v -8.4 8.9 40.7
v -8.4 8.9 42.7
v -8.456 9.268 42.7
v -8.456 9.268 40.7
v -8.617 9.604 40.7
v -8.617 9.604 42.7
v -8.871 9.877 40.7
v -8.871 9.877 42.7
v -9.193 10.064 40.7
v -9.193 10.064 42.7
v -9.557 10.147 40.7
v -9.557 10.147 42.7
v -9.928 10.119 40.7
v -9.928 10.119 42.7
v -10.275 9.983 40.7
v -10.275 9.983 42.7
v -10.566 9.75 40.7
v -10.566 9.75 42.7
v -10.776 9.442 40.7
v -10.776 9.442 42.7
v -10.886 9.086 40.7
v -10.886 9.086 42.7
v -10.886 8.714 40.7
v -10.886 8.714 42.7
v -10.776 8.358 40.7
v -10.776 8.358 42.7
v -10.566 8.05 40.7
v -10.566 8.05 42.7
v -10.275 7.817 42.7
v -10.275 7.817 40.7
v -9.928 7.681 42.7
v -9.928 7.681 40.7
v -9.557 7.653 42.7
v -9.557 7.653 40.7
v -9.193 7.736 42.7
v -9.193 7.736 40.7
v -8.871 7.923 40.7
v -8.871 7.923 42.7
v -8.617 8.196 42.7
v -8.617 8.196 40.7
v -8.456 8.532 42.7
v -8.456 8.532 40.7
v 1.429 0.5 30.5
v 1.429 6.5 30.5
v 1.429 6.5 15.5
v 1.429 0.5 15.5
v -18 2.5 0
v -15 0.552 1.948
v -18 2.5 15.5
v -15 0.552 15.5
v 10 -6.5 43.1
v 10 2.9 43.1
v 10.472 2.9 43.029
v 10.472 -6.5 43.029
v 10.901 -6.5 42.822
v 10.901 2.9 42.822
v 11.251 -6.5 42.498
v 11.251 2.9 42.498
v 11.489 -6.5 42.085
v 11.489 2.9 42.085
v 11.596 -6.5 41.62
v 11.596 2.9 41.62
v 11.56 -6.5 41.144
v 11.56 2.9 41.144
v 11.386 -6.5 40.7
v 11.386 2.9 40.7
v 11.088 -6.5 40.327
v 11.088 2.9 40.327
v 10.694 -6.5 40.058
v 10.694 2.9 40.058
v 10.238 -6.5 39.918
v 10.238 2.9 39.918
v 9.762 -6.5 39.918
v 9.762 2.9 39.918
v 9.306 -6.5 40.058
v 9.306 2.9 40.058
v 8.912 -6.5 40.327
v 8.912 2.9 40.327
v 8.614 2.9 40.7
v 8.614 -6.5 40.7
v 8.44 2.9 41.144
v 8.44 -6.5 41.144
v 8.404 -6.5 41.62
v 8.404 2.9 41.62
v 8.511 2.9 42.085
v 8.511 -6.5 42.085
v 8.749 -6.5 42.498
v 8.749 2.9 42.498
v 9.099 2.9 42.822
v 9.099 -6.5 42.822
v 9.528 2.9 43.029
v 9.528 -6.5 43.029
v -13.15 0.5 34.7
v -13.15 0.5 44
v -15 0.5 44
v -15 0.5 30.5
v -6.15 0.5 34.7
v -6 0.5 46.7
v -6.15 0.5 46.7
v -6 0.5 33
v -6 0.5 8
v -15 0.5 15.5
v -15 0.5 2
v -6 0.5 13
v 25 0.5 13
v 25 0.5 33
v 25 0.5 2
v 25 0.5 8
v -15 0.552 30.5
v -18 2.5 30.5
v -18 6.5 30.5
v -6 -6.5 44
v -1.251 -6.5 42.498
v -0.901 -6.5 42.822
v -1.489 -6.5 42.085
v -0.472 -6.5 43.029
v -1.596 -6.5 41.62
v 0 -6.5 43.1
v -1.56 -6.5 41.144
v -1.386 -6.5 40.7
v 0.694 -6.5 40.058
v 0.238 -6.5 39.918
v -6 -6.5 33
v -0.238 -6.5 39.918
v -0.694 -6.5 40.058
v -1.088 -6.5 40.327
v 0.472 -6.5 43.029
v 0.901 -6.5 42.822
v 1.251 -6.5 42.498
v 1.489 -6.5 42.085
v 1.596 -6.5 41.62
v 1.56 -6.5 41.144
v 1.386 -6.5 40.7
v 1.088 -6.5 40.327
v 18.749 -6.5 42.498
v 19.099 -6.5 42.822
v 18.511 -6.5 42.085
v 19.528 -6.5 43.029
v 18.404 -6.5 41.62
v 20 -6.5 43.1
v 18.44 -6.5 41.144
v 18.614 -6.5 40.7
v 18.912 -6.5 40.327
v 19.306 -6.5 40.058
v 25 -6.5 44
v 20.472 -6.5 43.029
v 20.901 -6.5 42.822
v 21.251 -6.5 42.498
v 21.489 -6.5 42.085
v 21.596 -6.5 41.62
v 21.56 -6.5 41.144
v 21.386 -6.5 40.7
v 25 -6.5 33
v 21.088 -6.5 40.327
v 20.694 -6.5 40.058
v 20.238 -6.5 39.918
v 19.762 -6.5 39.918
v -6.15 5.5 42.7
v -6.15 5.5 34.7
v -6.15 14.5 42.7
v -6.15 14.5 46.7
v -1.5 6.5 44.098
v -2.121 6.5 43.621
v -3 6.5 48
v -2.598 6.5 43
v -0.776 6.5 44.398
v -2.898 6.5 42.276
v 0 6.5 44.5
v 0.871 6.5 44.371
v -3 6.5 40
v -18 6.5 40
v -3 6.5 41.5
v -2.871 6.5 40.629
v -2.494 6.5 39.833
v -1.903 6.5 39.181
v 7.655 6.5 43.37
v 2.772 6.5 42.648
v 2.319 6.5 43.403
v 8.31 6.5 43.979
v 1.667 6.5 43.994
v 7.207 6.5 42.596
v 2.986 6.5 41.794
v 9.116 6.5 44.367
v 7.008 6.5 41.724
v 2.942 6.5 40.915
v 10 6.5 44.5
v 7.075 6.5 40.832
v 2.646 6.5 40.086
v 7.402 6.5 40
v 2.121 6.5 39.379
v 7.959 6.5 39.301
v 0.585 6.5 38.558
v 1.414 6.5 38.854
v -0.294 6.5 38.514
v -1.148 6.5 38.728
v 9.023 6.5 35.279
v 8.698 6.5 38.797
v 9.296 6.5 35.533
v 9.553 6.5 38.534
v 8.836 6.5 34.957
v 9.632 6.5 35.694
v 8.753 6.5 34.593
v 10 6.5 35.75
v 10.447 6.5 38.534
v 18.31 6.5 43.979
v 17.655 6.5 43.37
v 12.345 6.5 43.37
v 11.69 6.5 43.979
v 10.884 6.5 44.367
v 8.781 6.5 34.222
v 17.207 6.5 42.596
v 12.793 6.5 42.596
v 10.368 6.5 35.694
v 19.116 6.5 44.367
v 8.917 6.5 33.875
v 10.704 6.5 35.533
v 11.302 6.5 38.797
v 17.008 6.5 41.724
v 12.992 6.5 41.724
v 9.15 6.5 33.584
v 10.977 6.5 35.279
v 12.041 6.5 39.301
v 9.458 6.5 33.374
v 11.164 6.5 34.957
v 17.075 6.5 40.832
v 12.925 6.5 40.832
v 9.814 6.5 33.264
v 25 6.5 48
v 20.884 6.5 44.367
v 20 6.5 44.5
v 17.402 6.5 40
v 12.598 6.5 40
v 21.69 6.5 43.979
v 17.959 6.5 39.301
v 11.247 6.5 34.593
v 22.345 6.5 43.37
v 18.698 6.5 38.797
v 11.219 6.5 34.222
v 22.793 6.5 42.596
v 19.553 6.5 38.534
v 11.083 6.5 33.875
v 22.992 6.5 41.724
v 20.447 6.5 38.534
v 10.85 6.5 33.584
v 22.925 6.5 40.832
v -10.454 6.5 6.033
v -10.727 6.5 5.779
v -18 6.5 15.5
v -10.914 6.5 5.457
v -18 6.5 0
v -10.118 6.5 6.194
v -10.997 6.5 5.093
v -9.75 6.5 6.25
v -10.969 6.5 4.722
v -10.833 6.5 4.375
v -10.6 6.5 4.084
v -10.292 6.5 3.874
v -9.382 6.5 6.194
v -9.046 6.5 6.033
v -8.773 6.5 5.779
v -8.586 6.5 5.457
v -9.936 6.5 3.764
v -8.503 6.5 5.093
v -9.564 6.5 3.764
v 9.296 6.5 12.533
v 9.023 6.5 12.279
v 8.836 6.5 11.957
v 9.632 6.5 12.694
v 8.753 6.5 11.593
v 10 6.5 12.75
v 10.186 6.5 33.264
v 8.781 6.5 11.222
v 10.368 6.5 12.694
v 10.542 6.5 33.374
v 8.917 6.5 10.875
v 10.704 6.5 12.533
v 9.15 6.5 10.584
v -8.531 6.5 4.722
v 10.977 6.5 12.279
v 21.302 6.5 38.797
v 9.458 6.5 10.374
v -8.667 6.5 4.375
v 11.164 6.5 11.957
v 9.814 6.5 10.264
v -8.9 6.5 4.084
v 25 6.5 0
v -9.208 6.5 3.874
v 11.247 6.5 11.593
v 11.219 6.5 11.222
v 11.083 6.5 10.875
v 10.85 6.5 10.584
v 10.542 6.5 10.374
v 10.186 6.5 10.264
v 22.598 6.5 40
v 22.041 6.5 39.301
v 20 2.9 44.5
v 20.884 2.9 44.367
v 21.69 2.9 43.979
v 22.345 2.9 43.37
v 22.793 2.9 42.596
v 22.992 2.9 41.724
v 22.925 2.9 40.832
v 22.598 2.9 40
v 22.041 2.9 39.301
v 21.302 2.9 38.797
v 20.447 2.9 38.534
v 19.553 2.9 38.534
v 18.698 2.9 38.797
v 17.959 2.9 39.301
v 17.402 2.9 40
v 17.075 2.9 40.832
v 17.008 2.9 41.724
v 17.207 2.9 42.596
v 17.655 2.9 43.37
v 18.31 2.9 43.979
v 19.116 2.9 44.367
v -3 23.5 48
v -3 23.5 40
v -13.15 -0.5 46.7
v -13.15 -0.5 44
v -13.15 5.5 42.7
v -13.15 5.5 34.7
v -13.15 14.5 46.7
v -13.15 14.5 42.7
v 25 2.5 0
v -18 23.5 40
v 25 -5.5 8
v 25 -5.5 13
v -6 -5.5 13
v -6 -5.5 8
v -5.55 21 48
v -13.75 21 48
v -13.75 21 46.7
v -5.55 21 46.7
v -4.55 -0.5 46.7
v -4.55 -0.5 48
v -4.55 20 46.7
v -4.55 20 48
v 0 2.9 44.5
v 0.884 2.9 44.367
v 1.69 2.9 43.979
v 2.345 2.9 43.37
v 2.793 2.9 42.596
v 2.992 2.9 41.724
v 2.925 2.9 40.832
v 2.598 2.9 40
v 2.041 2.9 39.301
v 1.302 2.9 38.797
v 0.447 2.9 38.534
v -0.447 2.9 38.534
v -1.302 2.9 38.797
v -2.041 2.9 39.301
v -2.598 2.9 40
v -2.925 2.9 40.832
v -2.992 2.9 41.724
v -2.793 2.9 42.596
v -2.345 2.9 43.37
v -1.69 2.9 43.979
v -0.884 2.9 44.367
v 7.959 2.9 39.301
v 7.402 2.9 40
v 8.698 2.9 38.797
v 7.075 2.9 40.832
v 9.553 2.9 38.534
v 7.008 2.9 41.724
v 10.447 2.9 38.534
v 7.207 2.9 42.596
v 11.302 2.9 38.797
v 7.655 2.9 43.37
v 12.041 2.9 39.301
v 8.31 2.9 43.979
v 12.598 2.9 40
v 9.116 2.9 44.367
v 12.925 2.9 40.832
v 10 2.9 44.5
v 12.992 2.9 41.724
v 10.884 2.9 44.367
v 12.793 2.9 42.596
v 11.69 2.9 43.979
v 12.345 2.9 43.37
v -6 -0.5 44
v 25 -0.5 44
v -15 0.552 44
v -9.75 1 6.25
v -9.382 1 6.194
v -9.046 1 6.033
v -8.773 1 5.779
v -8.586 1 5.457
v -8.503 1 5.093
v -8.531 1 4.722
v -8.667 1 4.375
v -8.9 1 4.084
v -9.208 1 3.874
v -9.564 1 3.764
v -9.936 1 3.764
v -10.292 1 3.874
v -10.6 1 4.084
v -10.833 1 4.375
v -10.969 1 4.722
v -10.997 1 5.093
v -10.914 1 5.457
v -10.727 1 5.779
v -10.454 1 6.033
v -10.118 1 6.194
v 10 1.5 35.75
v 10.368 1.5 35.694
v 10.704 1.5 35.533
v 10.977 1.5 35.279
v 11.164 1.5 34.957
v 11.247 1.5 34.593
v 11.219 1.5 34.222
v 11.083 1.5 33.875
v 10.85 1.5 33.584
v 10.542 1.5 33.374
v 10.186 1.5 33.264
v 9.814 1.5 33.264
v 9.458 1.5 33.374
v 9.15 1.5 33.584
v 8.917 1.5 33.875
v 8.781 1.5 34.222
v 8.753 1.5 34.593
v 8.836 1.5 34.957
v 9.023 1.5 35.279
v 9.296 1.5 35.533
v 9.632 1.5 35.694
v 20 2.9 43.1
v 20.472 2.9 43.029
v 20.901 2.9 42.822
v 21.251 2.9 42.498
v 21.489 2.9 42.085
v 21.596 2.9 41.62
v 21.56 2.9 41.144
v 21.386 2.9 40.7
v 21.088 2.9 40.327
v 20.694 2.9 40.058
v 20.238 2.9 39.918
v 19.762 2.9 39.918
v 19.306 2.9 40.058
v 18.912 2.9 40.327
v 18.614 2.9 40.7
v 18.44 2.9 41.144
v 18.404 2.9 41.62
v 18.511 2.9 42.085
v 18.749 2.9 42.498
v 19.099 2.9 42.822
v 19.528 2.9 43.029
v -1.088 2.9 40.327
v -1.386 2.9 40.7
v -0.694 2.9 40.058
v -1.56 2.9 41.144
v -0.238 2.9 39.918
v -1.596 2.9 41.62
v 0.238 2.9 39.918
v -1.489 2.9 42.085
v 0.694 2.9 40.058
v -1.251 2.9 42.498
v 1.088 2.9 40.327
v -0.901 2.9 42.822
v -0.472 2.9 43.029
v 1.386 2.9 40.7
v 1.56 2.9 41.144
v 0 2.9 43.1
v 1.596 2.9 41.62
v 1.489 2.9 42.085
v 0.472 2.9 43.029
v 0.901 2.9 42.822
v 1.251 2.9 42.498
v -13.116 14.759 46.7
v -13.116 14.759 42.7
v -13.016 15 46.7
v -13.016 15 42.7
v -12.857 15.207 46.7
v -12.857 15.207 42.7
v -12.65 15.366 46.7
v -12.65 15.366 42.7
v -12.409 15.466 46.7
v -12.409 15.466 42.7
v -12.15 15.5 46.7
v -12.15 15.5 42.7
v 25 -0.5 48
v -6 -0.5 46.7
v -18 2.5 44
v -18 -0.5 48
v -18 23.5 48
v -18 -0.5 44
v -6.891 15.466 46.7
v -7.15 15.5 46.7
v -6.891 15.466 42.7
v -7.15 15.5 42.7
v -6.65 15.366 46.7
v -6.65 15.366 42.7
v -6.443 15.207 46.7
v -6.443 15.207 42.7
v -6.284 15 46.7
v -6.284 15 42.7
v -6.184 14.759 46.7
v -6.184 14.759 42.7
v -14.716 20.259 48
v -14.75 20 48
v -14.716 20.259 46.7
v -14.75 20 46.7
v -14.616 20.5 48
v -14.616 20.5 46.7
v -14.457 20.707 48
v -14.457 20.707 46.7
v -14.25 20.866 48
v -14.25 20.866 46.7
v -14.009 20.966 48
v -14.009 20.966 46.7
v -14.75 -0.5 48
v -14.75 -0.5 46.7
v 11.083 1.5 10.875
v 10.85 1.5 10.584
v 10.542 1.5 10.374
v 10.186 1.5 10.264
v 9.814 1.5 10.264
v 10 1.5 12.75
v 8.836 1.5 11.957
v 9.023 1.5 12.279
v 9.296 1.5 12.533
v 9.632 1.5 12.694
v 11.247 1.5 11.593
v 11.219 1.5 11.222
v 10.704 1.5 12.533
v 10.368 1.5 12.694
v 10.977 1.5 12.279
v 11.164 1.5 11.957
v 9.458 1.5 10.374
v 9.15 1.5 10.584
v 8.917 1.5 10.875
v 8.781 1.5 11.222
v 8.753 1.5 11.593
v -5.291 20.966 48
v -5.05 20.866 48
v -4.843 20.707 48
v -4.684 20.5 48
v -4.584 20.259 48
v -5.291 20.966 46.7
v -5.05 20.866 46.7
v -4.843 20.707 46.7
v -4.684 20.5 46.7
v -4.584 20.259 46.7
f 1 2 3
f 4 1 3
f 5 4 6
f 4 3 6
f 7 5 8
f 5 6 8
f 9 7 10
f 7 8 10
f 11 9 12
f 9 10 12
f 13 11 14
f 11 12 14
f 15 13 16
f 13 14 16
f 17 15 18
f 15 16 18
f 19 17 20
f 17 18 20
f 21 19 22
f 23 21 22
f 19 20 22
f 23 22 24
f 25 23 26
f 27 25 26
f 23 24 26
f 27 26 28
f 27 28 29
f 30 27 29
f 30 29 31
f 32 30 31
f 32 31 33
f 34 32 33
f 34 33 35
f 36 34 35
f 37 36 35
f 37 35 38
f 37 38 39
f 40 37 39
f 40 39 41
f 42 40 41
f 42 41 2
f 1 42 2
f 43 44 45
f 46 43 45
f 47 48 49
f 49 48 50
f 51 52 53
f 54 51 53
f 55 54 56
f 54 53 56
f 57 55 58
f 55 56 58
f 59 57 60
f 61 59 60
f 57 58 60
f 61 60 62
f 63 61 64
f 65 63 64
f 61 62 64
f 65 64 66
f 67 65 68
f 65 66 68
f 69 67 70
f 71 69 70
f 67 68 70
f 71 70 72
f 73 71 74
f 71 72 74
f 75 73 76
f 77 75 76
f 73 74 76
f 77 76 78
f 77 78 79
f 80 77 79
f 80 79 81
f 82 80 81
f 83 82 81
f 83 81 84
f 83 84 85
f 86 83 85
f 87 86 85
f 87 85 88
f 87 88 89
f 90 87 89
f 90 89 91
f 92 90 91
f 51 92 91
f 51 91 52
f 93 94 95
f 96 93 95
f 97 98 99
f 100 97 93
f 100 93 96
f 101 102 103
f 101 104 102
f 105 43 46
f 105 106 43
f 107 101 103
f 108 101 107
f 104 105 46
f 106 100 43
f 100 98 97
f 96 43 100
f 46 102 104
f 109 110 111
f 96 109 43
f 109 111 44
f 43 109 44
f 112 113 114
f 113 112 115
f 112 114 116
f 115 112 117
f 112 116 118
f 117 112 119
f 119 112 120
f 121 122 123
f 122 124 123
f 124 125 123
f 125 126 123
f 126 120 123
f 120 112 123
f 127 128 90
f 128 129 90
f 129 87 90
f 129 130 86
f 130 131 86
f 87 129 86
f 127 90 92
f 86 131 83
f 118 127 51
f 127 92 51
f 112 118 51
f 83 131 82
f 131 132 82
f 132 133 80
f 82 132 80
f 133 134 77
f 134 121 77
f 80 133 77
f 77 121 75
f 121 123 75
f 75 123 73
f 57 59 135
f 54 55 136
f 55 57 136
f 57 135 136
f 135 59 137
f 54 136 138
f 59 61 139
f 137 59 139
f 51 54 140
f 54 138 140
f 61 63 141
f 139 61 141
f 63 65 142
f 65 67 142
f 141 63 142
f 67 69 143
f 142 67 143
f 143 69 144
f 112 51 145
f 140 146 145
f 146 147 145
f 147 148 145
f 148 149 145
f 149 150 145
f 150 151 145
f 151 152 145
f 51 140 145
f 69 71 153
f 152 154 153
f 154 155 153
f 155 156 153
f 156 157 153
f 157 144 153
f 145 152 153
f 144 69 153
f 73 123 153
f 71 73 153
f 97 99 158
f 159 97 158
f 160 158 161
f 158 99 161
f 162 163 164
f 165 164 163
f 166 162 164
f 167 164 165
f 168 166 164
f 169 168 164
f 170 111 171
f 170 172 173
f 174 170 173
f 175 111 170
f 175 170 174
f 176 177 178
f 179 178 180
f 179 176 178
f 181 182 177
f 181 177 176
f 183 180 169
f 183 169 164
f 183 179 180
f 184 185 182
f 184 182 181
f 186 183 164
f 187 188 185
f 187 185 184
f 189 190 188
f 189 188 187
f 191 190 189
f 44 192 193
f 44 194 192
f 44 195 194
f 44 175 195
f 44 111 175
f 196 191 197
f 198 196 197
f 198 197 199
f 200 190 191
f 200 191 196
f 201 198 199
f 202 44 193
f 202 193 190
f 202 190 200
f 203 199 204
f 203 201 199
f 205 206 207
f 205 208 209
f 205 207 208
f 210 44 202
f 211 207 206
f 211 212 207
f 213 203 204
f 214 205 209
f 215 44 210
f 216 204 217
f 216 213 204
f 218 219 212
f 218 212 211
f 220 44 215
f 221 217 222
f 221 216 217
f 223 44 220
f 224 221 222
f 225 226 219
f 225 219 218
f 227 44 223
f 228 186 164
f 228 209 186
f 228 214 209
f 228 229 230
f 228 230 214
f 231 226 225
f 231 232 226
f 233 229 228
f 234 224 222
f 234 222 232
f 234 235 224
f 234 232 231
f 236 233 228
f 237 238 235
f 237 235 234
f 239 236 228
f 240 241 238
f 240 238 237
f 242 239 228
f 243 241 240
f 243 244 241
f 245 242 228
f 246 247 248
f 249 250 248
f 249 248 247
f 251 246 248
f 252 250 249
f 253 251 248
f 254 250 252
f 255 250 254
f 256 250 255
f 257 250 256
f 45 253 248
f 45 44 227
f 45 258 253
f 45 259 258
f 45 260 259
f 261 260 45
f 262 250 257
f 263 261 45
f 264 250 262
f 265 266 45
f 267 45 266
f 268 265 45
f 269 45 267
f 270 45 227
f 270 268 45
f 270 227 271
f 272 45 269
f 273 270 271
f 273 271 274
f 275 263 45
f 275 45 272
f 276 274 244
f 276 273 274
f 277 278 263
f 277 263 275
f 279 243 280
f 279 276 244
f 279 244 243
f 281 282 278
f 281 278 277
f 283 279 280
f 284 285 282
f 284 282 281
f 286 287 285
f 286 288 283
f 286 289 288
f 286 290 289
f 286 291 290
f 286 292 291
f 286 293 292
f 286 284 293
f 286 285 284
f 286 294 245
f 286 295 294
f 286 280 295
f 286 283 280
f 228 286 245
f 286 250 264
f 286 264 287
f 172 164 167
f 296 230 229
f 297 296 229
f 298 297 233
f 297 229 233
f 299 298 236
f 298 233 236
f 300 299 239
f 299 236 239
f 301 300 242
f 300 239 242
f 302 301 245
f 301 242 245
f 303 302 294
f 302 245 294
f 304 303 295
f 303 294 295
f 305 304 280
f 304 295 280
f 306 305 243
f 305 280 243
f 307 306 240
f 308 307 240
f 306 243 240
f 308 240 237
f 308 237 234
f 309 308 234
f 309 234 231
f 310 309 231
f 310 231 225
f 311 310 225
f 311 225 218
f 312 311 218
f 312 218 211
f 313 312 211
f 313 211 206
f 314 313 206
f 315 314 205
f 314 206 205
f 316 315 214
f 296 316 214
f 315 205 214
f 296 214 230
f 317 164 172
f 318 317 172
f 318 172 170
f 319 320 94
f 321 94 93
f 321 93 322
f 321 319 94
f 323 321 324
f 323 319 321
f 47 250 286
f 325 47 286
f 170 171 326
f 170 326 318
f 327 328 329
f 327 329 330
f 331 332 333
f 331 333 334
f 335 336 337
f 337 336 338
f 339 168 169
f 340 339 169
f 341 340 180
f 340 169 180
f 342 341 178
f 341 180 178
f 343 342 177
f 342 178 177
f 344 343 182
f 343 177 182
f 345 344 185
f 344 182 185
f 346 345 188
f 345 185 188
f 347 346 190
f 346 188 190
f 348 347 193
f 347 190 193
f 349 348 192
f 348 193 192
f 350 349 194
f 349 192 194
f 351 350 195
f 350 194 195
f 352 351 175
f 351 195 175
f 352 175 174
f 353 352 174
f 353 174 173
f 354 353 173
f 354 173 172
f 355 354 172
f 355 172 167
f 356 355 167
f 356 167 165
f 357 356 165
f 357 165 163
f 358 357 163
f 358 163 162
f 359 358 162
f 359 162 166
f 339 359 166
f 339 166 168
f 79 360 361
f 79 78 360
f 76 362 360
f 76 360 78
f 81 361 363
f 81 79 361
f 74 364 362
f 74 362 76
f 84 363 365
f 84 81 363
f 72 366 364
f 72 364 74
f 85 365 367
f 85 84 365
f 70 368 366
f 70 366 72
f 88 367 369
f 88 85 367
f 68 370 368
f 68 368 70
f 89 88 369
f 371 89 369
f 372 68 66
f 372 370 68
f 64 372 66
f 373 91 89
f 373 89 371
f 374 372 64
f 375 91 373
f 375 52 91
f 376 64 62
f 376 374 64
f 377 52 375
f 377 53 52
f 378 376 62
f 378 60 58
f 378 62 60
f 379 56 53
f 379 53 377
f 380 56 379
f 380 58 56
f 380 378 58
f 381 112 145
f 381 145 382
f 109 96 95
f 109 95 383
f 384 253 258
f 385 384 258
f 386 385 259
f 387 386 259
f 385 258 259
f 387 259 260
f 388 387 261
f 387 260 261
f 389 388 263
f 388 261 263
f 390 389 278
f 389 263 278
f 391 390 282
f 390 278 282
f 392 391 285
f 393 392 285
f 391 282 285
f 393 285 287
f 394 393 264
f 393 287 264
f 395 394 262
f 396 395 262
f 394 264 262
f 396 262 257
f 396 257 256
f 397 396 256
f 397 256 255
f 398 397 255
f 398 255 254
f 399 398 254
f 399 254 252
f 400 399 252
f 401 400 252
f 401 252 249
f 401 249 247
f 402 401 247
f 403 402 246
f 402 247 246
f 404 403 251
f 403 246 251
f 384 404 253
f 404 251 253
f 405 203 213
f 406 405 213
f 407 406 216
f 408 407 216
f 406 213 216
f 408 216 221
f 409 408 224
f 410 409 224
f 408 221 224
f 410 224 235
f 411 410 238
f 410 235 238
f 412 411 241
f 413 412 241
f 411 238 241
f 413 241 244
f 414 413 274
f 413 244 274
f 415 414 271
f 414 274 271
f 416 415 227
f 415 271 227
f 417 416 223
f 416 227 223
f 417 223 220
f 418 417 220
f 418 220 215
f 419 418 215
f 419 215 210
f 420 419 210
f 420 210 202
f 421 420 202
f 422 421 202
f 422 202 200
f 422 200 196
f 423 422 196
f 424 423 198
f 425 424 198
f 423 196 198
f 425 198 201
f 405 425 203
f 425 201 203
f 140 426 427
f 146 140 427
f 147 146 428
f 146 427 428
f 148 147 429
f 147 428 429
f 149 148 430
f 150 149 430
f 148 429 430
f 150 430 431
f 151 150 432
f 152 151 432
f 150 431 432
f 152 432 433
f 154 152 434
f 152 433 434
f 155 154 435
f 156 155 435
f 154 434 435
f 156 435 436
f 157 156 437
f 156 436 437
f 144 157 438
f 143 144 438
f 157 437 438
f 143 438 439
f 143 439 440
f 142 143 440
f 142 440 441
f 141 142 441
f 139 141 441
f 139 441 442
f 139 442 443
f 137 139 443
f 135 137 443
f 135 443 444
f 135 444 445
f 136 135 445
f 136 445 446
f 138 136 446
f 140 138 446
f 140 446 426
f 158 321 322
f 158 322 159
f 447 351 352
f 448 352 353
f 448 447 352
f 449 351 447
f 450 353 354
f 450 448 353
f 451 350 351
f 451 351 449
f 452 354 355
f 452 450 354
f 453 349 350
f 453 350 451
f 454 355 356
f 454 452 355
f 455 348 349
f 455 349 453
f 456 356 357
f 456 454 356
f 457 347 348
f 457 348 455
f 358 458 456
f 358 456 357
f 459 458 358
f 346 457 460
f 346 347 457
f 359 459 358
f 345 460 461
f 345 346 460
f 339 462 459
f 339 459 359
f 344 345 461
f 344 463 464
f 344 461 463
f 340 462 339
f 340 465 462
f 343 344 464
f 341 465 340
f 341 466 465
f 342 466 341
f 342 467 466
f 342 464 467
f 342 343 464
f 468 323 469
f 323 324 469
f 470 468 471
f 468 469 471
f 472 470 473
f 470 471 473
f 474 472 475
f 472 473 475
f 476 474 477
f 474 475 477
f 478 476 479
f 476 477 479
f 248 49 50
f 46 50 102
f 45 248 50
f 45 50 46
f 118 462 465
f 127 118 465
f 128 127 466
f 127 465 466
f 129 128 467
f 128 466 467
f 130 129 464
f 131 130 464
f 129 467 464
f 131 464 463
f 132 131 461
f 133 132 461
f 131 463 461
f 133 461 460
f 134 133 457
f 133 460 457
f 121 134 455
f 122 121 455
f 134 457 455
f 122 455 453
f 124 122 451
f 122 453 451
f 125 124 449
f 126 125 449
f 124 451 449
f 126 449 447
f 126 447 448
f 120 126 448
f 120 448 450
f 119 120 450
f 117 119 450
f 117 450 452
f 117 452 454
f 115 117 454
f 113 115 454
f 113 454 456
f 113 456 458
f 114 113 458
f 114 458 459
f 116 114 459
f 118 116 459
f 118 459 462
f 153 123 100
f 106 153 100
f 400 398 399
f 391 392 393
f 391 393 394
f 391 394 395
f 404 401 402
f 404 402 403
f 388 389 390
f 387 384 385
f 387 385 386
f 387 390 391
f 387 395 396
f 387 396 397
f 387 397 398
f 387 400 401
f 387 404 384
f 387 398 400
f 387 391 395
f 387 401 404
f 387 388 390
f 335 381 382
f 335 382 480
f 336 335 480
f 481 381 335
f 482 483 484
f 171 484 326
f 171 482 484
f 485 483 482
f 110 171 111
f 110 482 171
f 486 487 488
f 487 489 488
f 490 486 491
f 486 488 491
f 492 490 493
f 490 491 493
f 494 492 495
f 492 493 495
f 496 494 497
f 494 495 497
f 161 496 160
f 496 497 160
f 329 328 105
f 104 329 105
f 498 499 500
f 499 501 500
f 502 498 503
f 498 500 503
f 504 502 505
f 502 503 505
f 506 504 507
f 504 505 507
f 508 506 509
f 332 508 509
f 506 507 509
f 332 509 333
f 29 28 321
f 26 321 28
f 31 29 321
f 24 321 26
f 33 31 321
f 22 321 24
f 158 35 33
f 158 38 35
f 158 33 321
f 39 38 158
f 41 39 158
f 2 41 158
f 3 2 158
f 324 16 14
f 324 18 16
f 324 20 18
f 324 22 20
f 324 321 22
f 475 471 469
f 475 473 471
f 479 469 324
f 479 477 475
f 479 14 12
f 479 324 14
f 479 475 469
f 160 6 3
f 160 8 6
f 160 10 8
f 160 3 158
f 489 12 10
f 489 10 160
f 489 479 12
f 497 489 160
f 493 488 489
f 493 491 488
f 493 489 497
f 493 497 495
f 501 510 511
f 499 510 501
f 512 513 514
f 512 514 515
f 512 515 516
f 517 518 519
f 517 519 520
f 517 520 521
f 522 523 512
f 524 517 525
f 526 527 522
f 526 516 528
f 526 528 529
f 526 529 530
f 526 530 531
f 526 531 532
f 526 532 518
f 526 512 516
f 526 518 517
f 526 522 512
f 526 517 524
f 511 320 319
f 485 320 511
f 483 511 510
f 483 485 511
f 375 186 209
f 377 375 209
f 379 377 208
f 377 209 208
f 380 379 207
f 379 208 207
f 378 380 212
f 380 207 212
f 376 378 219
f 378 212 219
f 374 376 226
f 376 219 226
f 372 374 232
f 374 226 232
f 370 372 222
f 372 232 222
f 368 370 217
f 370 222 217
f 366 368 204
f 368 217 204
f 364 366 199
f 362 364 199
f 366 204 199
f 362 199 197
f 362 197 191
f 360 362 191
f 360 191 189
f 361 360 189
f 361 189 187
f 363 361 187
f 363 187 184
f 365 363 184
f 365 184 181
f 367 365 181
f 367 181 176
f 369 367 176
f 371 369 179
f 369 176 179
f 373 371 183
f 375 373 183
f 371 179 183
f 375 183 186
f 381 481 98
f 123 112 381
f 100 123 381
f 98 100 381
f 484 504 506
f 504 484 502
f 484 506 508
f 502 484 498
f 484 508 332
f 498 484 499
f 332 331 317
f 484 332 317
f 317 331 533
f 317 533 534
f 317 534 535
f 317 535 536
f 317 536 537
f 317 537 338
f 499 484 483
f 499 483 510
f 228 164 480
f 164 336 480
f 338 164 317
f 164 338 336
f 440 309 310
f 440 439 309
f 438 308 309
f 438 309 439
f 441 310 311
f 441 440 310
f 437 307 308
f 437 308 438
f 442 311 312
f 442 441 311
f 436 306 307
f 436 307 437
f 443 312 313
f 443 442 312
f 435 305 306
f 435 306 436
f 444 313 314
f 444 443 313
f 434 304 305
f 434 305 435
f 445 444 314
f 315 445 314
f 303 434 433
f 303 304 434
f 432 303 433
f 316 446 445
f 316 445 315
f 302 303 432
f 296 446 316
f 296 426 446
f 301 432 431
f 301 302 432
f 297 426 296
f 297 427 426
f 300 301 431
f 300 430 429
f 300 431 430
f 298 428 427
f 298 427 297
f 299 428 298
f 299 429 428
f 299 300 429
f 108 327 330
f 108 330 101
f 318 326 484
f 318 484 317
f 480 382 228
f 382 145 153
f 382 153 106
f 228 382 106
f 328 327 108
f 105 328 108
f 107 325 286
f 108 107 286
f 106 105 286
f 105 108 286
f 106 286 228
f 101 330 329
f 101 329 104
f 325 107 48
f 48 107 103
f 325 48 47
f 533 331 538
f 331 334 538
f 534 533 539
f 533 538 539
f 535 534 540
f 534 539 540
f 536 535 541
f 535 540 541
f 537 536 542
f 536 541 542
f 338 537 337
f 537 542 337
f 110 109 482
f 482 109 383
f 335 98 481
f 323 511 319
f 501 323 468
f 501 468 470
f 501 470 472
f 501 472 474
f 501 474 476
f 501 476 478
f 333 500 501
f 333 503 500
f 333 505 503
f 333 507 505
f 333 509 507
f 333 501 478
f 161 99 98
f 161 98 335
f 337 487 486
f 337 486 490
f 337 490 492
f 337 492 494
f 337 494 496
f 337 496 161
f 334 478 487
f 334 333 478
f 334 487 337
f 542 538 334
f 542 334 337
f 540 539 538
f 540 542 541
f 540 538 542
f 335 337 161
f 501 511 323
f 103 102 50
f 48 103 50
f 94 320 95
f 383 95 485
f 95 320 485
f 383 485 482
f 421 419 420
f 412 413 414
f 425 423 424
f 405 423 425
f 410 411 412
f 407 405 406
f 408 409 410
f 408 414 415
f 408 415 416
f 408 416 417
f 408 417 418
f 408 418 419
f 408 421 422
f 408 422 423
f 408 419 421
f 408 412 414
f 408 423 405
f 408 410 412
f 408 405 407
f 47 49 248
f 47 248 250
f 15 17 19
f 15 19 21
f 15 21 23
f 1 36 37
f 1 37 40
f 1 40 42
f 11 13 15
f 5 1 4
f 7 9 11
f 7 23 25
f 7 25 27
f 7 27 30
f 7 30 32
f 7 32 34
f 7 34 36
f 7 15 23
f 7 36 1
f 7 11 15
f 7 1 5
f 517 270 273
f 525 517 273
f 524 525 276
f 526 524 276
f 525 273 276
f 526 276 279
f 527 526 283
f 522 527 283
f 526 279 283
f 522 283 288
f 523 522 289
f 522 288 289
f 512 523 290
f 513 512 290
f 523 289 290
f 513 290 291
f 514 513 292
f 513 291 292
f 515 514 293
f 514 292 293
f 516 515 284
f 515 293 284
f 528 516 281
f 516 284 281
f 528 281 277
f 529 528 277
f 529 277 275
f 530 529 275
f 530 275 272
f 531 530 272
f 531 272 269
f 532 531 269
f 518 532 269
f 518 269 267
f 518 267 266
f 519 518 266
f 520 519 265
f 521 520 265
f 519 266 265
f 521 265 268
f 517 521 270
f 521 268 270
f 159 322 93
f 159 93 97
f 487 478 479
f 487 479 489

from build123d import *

# Parameters (mm, degrees)
SKETCH_1_W           = 50
SKETCH_1_H           = 13
EXTRUDE_1_DEPTH      = 48
SKETCH_9_R           = 1.6
CUT_EXTRUDE_7_DEPTH  = 14
SKETCH_10_R          = 3
CUT_EXTRUDE_10_DEPTH = 3.6
SKETCH_2_W           = 4
SKETCH_2_H           = 6
CUT_EXTRUDE_15_DEPTH = 51
SKETCH_18_W          = 20
SKETCH_18_H          = 7
CUT_EXTRUDE_16_DEPTH = 51
SKETCH_19_W          = 13
SKETCH_19_H          = 1
CUT_EXTRUDE_17_DEPTH = 51
SKETCH_21_W          = 8
SKETCH_21_H          = 6
CUT_EXTRUDE_19_DEPTH = 51
CHAMFER_1_SIZE       = 2
CUT_EXTRUDE_START    = 8
SKETCH_22_W          = 10
SKETCH_22_H          = 9
CUT_EXTRUDE_20_DEPTH = 49
CHAMFER_2_SIZE       = 3
CHAMFER_2_SIZE2      = 1.94822278
SKETCH_23_W          = 9
SKETCH_23_H          = 2.5
CUT_EXTRUDE_21_DEPTH = 41
SKETCH_26_W          = 7
SKETCH_26_H          = 4
CUT_EXTRUDE_24_DEPTH = 49
SKETCH_27_W          = 4
SKETCH_27_H          = 7
EXTRUDE_2_DEPTH      = 5
SKETCH_37_R          = 1.25
CUT_EXTRUDE_30_DEPTH = 5
SKETCH_38_W          = 15
SKETCH_38_H          = 8
EXTRUDE_3_DEPTH      = 17
SKETCH_39_W          = 10.2
SKETCH_39_H          = 21.5
CUT_EXTRUDE_31_DEPTH = 1.3
FILLET_2_R           = 1
SKETCH_40_R          = 1.25
CUT_EXTRUDE_32_DEPTH = 6
SKETCH_41_W          = 7
SKETCH_41_H          = 22
CUT_EXTRUDE_33_DEPTH = 4
SKETCH_43_W          = 7
SKETCH_43_H          = 12
CUT_EXTRUDE_35_DEPTH = 8
FILLET_3_R           = 1
SKETCH_44_W          = 19.428817274
SKETCH_44_H          = 15
CUT_EXTRUDE_37_DEPTH = 8
SKETCH_45_R          = 1.25
CUT_EXTRUDE_38_DEPTH = 5.5
SKETCH_46_W          = 45.087872193
SKETCH_46_H          = 5.805305433
CUT_EXTRUDE_39_DEPTH = 9


with BuildPart() as part:
    # Эскиз1 → Бобышка-Вытянуть1 (new body)
    with BuildSketch(Plane.XY):
        Rectangle(SKETCH_1_W, SKETCH_1_H)
    extrude(amount=EXTRUDE_1_DEPTH)

    # Эскиз9 → Вырез-Вытянуть7 (cut, through all)
    with BuildSketch(Plane(origin=(0, 6.5, 0), x_dir=(1, 0, 0), z_dir=(0, 1, 0))):
        with Locations(Location((20, -41.5, 0), (0, 0, 270))):  # turned: the seam where the file's is
            Circle(SKETCH_9_R)
        with Locations(Location((10, -41.5, 0), (0, 0, 270))):  # turned: the seam where the file's is
            Circle(SKETCH_9_R)
        with Locations(Location((0, -41.5, 0), (0, 0, 270))):  # turned: the seam where the file's is
            Circle(SKETCH_9_R)
    extrude(amount=-CUT_EXTRUDE_7_DEPTH, mode=Mode.SUBTRACT)

    # Эскиз10 → Вырез-Вытянуть10 (cut)
    with BuildSketch(Plane(origin=(0, 6.5, 0), x_dir=(1, 0, 0), z_dir=(0, 1, 0))):
        with Locations(Location((20, -41.5, 0), (0, 0, 270))):  # turned: the seam where the file's is
            Circle(SKETCH_10_R)
        with Locations(Location((10, -41.5, 0), (0, 0, 270))):  # turned: the seam where the file's is
            Circle(SKETCH_10_R)
        with Locations(Location((0, -41.5, 0), (0, 0, 270))):  # turned: the seam where the file's is
            Circle(SKETCH_10_R)
    extrude(amount=-CUT_EXTRUDE_10_DEPTH, mode=Mode.SUBTRACT)

    # Эскиз2 → Вырез-Вытянуть15 (cut, through all)
    with BuildSketch(Plane.ZY.offset(25)):
        with Locations((46, -3.5)):
            Rectangle(SKETCH_2_W, SKETCH_2_H)
    extrude(amount=-CUT_EXTRUDE_15_DEPTH, mode=Mode.SUBTRACT)

    # Эскиз18 → Вырез-Вытянуть16 (cut, through all)
    with BuildSketch(Plane.ZY.offset(25)):
        with Locations((23, -3)):
            Rectangle(SKETCH_18_W, SKETCH_18_H)
    extrude(amount=-CUT_EXTRUDE_16_DEPTH, mode=Mode.SUBTRACT)

    # Эскиз19 → Вырез-Вытянуть17 (cut, through all)
    with BuildSketch(Plane(origin=(25, 0, 0), x_dir=(0, 0, -1), z_dir=(1, 0, 0))):
        with Locations((-6.5, -6)):
            Rectangle(SKETCH_19_W, SKETCH_19_H)
    extrude(amount=-CUT_EXTRUDE_17_DEPTH, mode=Mode.SUBTRACT)

    # Эскиз21 → Вырез-Вытянуть19 (cut, through all)
    with BuildSketch(Plane(origin=(25, 0, 0), x_dir=(0, 0, -1), z_dir=(1, 0, 0))):
        with Locations((-4, -2.5)):
            Rectangle(SKETCH_21_W, SKETCH_21_H)
    extrude(amount=-CUT_EXTRUDE_19_DEPTH, mode=Mode.SUBTRACT)

    # Фаска1
    chamfer_1_edges = [part.edges().sort_by_distance(p)[0] for p in [
        (0, 0.5, 0),
    ]]
    chamfer(chamfer_1_edges, length=CHAMFER_1_SIZE)

    # Эскиз22 → Вырез-Вытянуть20 (cut, through all)
    with BuildSketch(Plane(origin=(0, 0, 8), x_dir=(-1, 0, 0), z_dir=(0, 0, -1)).offset(CUT_EXTRUDE_START)):
        with Locations((20, -2)):
            Rectangle(SKETCH_22_W, SKETCH_22_H)
    extrude(amount=-CUT_EXTRUDE_20_DEPTH, mode=Mode.SUBTRACT)

    # Фаска2
    chamfer_2_edges = [part.edges().sort_by_distance(p)[0] for p in [
        (-15, 2.5, 24),
    ]]
    chamfer_2_side = [part.faces().sort_by_distance(p)[0] for p in [
        (-20, 2.5, 24),
    ]]
    chamfer(chamfer_2_edges, length=CHAMFER_2_SIZE, length2=CHAMFER_2_SIZE2, reference=chamfer_2_side[0])

    # Эскиз23 → Вырез-Вытянуть21 (cut, through all)
    with BuildSketch(Plane(origin=(0, 0, 8), x_dir=(-1, 0, 0), z_dir=(0, 0, -1))):
        with Locations((10.5, -0.75)):
            Rectangle(SKETCH_23_W, SKETCH_23_H)
    extrude(amount=-CUT_EXTRUDE_21_DEPTH, mode=Mode.SUBTRACT)

    # Эскиз26 → Вырез-Вытянуть24 (cut, through all)
    with BuildSketch(Plane(origin=(0, 0, 0), x_dir=(-1, 0, 0), z_dir=(0, 0, -1))):
        with Locations((21.5, 4.5)):
            Rectangle(SKETCH_26_W, SKETCH_26_H)
    extrude(amount=-CUT_EXTRUDE_24_DEPTH, mode=Mode.SUBTRACT)

    # Эскиз27 → Бобышка-Вытянуть2 (add)
    with BuildSketch(Plane.ZY.offset(18)):
        with Locations((46, 3)):
            Rectangle(SKETCH_27_W, SKETCH_27_H)
    extrude(amount=-EXTRUDE_2_DEPTH)

    # Эскиз37 → Вырез-Вытянуть30 (cut)
    with BuildSketch(Plane(origin=(0, 6.5, 0), x_dir=(1, 0, 0), z_dir=(0, 1, 0))):
        with Locations(Location((10, -34.5, 0), (0, 0, 270))):  # turned: the seam where the file's is
            Circle(SKETCH_37_R)
        with Locations(Location((10, -11.5, 0), (0, 0, 270))):  # turned: the seam where the file's is
            Circle(SKETCH_37_R)
    extrude(amount=-CUT_EXTRUDE_30_DEPTH, mode=Mode.SUBTRACT)

    # Эскиз38 → Бобышка-Вытянуть3 (add)
    with BuildSketch(Plane(origin=(0, 6.5, 0), x_dir=(1, 0, 0), z_dir=(0, 1, 0))):
        with Locations((-10.5, -44)):
            Rectangle(SKETCH_38_W, SKETCH_38_H)
    extrude(amount=EXTRUDE_3_DEPTH)

    # Эскиз39 → Вырез-Вытянуть31 (cut)
    with BuildSketch(Plane.XY.offset(48)):
        with Locations((-9.65, 10.25)):
            Rectangle(SKETCH_39_W, SKETCH_39_H)
    extrude(amount=-CUT_EXTRUDE_31_DEPTH, mode=Mode.SUBTRACT)

    # Скругление2
    fillet_2_edges = [part.edges().sort_by_distance(p)[0] for p in [
        (-14.75, 21, 47.35),
        (-4.55, 21, 47.35),
    ]]
    fillet(fillet_2_edges, radius=FILLET_2_R)

    # Эскиз40 → Вырез-Вытянуть32 (cut)
    with BuildSketch(Plane.XY.offset(46.7)):
        with Locations((-9.65, 8.9)):
            Circle(SKETCH_40_R)
    extrude(amount=-CUT_EXTRUDE_32_DEPTH, mode=Mode.SUBTRACT)

    # Эскиз41 → Вырез-Вытянуть33 (cut)
    with BuildSketch(Plane.XY.offset(46.7)):
        with Locations((-9.65, 4.5)):
            Rectangle(SKETCH_41_W, SKETCH_41_H)
    extrude(amount=-CUT_EXTRUDE_33_DEPTH, mode=Mode.SUBTRACT)

    # Эскиз43 → Вырез-Вытянуть35 (cut)
    with BuildSketch(Plane.XY.offset(42.7)):
        with Locations((-9.65, -0.5)):
            Rectangle(SKETCH_43_W, SKETCH_43_H)
    extrude(amount=-CUT_EXTRUDE_35_DEPTH, mode=Mode.SUBTRACT)

    # Скругление3
    fillet_3_edges = [part.edges().sort_by_distance(p)[0] for p in [
        (-6.15, 15.5, 44.7),
        (-13.15, 15.5, 44.7),
    ]]
    fillet(fillet_3_edges, radius=FILLET_3_R)

    # Эскиз44 → Вырез-Вытянуть37 (cut)
    with BuildSketch(Plane(origin=(0, 6.5, 0), x_dir=(1, 0, 0), z_dir=(0, 1, 0))):
        with Locations((-8.285591363, -23)):
            Rectangle(SKETCH_44_W, SKETCH_44_H)
    extrude(amount=-CUT_EXTRUDE_37_DEPTH, mode=Mode.SUBTRACT)

    # Эскиз45 → Вырез-Вытянуть38 (cut)
    with BuildSketch(Plane(origin=(0, 6.5, 0), x_dir=(1, 0, 0), z_dir=(0, 1, 0))):
        with Locations(Location((-9.75, -5, 0), (0, 0, 270))):  # turned: the seam where the file's is
            Circle(SKETCH_45_R)
    extrude(amount=-CUT_EXTRUDE_38_DEPTH, mode=Mode.SUBTRACT)

    # Эскиз46 → Вырез-Вытянуть39 (cut)
    with BuildSketch(Plane.ZY.offset(15)):
        with Locations((23.854867364, -4.199105634)):
            Rectangle(SKETCH_46_W, SKETCH_46_H)
    extrude(amount=-CUT_EXTRUDE_39_DEPTH, mode=Mode.SUBTRACT)


solid = part.part
